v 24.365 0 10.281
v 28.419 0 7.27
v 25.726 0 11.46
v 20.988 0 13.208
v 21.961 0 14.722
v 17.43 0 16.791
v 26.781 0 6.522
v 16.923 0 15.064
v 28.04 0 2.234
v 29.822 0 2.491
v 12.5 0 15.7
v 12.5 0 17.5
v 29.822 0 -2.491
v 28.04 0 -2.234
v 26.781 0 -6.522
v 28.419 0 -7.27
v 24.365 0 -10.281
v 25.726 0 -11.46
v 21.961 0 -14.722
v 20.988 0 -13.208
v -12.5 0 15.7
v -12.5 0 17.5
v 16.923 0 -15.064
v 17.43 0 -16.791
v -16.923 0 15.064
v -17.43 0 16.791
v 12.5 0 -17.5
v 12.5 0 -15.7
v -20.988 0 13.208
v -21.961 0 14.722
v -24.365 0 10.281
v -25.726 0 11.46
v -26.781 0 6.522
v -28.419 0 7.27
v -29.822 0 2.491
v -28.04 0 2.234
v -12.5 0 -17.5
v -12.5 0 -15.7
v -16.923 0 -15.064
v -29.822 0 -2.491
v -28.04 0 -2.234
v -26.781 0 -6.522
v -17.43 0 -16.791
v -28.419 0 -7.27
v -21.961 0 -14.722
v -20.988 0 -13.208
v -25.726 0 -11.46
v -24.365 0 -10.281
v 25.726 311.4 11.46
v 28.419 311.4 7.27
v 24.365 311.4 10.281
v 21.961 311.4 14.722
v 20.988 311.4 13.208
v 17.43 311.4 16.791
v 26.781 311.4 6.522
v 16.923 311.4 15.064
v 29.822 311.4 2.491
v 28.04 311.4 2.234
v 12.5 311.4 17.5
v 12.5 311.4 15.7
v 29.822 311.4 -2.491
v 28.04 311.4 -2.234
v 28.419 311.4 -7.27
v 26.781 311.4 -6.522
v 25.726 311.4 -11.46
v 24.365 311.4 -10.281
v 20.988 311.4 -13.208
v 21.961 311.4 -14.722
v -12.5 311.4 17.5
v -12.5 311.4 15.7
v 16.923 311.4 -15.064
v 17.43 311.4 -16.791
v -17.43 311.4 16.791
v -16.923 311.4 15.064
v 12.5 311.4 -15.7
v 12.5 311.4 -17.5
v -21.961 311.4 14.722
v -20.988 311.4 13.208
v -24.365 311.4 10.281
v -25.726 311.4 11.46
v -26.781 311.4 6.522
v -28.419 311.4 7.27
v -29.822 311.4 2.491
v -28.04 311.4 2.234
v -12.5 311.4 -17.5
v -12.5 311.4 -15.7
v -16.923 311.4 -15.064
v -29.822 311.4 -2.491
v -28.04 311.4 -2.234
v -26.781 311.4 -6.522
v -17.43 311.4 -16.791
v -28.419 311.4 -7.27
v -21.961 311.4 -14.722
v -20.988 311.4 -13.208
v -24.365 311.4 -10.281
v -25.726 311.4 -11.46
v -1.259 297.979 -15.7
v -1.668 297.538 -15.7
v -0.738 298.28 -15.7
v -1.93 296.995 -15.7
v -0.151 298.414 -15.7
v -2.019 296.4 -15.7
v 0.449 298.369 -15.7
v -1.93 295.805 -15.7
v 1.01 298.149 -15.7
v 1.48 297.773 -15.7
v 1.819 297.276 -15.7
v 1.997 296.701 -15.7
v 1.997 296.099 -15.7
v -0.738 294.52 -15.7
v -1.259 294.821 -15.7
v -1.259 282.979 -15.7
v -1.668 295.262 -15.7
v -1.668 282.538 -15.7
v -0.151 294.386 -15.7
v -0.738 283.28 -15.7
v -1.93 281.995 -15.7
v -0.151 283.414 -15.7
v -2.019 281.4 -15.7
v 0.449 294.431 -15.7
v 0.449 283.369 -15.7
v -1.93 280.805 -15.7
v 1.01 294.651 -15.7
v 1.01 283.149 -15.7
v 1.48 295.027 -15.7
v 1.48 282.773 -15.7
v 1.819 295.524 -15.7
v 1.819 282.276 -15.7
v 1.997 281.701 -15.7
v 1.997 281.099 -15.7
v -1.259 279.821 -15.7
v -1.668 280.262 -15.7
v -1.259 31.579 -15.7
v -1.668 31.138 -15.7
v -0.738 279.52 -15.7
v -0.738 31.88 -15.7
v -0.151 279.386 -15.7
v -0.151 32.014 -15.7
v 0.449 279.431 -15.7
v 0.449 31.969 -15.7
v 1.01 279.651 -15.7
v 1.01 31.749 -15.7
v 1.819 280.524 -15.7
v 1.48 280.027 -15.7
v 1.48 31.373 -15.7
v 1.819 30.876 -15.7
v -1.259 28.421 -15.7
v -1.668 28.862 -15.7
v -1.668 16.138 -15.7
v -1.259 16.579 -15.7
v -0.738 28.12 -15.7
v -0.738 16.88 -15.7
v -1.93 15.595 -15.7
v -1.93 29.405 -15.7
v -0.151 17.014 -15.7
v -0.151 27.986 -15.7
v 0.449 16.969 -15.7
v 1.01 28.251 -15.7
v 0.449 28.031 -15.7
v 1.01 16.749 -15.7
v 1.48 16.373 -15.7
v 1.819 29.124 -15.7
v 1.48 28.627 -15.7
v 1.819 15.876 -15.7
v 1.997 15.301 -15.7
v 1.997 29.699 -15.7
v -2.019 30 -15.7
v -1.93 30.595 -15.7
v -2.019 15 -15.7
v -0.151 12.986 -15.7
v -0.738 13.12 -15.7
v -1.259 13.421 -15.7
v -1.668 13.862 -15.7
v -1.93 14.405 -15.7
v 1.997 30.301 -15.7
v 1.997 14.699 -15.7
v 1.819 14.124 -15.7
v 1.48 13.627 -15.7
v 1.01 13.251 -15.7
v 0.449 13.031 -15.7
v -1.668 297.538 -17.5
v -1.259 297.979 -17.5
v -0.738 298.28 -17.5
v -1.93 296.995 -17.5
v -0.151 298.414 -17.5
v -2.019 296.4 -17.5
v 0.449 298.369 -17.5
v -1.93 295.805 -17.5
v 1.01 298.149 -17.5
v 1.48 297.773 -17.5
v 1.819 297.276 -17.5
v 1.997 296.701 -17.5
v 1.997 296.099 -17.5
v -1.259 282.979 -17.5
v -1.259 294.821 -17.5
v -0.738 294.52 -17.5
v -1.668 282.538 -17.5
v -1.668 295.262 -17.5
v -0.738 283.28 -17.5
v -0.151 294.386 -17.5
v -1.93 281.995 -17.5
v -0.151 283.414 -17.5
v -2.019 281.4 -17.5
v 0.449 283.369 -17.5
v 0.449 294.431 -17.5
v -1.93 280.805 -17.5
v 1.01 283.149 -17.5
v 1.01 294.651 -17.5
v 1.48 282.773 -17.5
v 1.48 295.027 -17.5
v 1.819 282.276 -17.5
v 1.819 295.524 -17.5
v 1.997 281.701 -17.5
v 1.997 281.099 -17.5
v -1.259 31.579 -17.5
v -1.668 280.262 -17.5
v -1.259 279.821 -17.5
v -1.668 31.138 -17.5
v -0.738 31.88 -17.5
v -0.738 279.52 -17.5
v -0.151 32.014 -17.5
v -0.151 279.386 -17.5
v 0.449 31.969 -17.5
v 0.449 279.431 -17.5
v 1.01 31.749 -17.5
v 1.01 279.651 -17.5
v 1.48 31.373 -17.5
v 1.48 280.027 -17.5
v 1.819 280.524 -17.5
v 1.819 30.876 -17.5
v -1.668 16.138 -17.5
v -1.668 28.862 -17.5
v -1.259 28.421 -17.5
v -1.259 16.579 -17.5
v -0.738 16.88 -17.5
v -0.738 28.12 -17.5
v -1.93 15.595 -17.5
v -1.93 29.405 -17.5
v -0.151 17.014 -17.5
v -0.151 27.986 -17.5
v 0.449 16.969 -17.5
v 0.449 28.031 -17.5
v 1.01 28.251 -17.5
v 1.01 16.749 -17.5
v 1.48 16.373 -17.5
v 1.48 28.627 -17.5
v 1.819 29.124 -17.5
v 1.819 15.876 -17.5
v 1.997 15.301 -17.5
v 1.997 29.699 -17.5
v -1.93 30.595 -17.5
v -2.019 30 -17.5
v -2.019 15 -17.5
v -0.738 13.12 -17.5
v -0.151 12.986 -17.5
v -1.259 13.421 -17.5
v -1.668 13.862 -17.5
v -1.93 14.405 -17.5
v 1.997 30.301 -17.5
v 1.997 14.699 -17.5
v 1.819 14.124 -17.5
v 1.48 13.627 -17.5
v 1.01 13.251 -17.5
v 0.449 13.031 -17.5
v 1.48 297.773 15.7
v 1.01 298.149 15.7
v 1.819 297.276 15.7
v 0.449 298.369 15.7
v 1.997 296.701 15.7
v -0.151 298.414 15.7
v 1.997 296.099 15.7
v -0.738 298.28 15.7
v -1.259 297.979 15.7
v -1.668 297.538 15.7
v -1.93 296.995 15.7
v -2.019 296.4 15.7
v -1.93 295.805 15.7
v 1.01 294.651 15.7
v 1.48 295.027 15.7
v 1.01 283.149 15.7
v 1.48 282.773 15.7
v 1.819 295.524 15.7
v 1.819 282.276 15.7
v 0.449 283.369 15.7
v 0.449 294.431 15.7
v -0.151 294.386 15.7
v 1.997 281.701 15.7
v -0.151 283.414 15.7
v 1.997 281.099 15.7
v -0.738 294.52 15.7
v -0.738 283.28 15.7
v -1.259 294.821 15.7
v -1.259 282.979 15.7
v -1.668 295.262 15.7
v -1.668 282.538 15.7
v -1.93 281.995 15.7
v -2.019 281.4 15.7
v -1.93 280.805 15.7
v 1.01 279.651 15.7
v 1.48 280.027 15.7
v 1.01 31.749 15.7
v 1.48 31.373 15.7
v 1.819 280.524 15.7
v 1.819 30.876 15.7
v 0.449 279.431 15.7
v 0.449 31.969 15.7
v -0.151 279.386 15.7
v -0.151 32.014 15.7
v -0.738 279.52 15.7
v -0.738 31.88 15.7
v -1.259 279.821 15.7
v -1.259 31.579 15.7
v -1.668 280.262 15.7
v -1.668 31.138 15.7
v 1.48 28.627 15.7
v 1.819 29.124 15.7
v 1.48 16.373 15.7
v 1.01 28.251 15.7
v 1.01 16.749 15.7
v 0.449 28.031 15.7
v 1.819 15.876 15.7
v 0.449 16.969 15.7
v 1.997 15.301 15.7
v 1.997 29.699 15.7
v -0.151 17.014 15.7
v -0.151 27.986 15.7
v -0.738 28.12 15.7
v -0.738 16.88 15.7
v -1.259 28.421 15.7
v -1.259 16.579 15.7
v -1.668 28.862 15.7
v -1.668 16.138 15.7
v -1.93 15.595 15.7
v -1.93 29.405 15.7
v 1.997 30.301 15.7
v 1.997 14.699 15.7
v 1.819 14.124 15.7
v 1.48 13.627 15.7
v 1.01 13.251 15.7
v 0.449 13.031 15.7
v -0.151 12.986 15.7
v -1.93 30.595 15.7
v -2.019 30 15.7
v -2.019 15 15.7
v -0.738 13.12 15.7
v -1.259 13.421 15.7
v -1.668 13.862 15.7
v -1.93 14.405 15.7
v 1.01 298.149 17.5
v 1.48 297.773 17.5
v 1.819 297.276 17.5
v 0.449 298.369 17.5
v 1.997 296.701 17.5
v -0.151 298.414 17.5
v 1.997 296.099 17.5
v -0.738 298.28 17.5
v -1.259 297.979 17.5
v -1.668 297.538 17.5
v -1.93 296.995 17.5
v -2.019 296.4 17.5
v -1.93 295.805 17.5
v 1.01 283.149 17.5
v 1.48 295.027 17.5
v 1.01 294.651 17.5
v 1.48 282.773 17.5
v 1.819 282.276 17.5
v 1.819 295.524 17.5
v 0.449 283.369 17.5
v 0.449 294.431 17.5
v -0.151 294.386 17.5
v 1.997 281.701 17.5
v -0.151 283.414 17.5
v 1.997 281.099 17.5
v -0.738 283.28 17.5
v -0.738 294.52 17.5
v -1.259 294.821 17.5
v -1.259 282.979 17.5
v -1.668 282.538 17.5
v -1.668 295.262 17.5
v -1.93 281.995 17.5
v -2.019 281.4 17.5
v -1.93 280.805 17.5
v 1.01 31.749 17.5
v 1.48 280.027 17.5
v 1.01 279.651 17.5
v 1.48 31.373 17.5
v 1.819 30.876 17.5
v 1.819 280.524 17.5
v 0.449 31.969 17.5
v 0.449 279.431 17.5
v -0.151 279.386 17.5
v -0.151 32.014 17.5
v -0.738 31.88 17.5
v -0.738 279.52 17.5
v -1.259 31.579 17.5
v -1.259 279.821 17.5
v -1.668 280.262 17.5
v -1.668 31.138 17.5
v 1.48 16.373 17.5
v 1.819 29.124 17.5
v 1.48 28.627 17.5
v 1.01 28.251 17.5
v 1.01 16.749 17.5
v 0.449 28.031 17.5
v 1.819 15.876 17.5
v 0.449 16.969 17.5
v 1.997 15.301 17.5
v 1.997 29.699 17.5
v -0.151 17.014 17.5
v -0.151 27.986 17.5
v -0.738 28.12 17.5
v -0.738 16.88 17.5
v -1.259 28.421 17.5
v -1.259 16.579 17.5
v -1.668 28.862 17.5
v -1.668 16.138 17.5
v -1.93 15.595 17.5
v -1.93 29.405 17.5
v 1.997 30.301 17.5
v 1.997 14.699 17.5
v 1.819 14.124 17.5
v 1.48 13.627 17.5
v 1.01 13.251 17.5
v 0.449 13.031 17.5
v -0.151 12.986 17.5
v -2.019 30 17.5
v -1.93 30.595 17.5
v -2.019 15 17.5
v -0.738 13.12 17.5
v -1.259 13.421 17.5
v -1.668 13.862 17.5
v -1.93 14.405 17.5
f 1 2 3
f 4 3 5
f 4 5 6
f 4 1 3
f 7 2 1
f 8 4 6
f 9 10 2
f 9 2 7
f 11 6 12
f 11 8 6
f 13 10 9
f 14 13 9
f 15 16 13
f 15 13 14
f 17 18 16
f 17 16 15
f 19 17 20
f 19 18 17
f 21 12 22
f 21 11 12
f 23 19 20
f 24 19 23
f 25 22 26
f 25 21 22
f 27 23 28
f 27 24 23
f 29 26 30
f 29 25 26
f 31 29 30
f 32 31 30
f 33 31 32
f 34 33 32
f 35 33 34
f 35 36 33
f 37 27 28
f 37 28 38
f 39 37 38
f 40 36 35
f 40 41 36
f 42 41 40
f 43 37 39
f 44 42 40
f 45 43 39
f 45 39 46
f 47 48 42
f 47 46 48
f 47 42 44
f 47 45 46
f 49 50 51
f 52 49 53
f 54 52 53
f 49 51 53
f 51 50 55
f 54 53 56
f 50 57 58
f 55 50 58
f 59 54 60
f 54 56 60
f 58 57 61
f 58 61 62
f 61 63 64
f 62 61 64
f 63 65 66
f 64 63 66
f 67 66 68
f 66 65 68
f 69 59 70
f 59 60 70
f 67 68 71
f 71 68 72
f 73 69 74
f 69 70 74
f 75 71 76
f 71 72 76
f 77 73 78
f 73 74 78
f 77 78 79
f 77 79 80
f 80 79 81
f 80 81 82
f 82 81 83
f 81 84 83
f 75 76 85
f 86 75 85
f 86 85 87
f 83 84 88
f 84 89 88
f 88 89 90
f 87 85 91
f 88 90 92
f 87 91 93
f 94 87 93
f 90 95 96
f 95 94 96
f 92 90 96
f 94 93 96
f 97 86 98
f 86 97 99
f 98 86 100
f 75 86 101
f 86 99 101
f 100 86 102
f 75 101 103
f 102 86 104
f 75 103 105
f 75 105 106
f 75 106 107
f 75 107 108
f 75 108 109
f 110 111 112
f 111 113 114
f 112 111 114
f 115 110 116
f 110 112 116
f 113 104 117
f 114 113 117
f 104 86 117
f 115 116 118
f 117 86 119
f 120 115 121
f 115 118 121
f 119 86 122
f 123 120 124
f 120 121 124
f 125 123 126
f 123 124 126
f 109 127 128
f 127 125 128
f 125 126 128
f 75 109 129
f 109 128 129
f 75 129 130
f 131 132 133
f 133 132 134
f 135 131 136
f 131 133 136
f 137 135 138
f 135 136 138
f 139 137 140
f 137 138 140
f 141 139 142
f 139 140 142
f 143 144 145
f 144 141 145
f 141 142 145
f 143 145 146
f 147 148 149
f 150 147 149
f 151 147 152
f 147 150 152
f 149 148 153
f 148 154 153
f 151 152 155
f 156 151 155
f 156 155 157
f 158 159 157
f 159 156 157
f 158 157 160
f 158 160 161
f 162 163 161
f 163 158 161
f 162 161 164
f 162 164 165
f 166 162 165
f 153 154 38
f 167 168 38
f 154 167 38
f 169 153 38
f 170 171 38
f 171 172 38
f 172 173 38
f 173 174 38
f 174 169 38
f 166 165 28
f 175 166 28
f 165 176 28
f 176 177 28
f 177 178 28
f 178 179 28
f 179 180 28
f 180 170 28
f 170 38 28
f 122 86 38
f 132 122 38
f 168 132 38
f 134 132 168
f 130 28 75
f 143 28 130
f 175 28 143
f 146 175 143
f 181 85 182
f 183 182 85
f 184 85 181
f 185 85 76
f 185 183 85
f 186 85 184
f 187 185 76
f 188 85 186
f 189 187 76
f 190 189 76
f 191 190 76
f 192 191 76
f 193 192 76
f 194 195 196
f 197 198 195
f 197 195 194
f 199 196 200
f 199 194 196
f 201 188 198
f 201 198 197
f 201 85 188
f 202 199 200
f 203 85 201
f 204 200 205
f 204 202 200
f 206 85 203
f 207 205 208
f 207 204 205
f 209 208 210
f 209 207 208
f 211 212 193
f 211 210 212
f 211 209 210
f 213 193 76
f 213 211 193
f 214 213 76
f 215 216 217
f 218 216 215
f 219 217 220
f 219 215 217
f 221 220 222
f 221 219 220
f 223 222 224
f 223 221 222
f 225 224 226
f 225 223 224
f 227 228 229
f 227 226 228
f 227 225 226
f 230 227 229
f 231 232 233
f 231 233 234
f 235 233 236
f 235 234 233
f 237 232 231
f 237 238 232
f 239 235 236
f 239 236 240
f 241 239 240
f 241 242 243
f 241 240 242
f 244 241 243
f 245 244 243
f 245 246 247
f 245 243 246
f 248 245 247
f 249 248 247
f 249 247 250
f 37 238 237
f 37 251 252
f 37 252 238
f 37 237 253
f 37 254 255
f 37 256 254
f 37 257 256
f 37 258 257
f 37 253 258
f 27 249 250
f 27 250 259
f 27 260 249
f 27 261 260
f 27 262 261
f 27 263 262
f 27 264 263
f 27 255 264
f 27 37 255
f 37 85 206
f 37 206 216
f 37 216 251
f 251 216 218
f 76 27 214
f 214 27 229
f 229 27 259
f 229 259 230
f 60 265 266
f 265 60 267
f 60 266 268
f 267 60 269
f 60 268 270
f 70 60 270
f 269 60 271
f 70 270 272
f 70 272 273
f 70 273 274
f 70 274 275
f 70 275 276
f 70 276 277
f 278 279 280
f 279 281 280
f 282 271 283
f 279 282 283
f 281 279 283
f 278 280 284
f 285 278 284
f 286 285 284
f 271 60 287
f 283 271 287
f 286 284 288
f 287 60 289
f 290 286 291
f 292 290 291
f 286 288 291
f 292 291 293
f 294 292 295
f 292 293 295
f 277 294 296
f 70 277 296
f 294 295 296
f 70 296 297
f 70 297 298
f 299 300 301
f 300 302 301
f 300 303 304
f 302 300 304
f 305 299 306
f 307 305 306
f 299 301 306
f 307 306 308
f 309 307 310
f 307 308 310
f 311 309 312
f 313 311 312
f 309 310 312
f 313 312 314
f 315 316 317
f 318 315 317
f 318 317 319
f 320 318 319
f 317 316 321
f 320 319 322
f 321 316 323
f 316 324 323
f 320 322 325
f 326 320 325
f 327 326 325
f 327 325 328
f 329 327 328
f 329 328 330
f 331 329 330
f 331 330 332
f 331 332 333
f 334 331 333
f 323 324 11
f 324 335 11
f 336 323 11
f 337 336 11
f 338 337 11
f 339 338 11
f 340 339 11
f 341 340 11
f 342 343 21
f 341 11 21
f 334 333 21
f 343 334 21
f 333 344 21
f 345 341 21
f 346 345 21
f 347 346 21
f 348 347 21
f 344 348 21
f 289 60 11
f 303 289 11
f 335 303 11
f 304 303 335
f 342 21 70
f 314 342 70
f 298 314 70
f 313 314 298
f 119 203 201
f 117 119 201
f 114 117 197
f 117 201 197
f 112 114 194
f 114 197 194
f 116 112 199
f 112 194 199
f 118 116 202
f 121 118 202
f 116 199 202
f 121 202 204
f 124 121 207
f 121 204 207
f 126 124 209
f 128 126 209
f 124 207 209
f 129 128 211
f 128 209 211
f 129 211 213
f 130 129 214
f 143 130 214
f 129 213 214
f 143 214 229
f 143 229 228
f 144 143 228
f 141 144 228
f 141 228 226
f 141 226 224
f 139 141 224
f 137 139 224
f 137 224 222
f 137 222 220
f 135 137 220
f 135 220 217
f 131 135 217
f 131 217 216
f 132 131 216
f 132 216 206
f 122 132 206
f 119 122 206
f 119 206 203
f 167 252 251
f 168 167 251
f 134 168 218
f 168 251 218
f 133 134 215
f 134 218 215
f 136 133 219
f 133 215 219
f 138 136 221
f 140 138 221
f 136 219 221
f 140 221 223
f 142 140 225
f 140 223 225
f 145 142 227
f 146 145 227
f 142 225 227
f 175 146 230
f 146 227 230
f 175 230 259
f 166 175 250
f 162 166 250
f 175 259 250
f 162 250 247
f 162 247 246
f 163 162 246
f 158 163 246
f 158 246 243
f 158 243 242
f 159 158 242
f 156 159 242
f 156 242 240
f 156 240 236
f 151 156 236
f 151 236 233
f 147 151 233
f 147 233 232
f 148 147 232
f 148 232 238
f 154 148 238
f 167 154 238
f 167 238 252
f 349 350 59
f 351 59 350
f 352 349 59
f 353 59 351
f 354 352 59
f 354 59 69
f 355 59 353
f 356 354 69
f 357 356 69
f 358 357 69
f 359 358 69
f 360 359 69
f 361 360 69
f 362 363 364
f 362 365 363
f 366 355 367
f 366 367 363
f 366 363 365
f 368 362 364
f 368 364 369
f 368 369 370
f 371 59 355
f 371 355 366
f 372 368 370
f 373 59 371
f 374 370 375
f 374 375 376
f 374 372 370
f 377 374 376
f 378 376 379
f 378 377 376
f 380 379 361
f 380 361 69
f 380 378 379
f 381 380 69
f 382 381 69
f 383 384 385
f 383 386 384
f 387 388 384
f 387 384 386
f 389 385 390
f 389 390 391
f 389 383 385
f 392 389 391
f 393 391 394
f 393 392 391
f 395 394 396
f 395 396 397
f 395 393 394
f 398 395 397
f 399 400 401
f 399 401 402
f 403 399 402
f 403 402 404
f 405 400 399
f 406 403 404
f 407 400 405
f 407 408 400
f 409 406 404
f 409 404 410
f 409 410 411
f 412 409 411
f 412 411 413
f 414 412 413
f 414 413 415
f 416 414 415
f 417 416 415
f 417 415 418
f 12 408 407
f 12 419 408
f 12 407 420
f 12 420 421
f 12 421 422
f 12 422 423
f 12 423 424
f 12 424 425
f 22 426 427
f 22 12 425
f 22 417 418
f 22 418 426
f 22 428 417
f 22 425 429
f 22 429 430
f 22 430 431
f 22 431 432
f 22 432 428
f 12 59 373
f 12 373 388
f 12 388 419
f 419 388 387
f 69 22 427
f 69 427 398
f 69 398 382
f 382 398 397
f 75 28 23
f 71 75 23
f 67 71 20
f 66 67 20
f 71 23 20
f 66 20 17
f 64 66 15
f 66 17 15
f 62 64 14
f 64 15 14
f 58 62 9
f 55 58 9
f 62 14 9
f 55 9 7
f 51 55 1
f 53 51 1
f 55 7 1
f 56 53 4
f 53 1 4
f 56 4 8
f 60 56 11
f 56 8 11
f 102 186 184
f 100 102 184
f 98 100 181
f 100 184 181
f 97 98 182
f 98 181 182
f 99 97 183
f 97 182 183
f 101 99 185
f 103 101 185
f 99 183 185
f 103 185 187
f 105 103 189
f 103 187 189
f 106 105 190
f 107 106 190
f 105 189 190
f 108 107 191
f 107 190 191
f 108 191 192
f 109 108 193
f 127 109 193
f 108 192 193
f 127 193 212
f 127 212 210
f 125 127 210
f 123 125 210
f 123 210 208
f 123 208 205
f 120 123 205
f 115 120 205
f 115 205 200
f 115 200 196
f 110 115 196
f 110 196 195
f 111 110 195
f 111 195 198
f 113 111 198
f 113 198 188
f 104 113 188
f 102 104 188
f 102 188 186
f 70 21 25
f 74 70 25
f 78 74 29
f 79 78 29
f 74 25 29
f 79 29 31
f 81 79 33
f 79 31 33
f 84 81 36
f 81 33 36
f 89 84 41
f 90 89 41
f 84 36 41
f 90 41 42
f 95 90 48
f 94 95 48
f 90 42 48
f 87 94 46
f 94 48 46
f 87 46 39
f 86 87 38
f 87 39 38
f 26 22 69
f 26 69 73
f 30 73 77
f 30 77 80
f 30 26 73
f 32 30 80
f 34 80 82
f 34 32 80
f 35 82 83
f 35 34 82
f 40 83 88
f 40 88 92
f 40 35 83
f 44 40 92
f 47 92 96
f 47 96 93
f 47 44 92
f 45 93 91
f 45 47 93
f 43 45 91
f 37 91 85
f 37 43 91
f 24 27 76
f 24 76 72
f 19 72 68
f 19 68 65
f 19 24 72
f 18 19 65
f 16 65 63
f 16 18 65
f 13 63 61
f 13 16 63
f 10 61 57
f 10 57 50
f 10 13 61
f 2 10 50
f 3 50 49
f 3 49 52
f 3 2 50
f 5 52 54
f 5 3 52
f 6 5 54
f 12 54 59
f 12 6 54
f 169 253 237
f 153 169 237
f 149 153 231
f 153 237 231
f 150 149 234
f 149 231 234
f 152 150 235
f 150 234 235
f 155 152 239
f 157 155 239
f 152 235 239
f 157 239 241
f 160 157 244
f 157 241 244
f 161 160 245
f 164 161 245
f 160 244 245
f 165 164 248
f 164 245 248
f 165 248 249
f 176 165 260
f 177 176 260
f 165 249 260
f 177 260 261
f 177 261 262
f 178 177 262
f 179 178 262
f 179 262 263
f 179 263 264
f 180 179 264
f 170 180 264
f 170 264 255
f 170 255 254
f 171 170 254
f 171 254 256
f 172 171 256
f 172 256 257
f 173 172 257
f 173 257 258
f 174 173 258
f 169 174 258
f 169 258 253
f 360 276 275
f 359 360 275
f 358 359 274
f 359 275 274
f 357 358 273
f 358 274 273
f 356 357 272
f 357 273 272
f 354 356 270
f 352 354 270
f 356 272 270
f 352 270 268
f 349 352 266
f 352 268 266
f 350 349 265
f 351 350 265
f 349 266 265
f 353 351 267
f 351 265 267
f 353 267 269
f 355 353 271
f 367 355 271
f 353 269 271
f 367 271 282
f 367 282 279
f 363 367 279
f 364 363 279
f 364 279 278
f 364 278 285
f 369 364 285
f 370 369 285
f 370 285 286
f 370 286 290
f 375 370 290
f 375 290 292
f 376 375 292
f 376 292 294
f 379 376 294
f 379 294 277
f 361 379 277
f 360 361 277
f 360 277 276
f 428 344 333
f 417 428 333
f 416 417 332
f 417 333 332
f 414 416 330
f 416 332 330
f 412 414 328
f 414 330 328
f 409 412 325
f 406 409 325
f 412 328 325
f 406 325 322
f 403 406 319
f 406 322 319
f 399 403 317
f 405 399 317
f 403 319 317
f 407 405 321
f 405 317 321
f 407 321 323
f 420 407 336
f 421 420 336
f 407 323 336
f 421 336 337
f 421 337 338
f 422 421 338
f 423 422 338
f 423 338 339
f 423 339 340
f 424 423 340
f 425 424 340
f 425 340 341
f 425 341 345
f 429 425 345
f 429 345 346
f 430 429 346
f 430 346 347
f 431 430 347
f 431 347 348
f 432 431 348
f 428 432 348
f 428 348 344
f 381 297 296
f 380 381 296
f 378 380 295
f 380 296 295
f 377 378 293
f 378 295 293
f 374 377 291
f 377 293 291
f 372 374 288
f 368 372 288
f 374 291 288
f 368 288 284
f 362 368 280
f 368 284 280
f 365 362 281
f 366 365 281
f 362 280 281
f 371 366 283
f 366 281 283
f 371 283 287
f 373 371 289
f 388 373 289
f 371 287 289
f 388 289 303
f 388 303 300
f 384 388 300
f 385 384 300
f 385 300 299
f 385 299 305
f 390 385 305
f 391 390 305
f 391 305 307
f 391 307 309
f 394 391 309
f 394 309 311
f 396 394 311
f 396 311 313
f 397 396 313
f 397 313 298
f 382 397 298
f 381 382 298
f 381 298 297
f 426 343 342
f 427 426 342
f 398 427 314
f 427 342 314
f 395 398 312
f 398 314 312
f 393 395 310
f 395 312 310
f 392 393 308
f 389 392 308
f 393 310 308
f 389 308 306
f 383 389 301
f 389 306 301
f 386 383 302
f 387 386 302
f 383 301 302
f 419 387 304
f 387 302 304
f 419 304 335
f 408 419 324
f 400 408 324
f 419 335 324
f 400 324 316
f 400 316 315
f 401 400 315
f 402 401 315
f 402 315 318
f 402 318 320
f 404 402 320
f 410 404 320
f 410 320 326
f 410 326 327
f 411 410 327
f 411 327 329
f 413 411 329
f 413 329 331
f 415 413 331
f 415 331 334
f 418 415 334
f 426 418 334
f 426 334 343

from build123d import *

# Parameters (mm, degrees)
EXTRUDE_1_DEPTH       = 311.4
HOLE_WIZARD_10_32_1_D = 4.0386


with BuildPart() as part:
    # 草圖1 → 填料-伸長1 (new body)
    with BuildSketch(Plane(origin=(0, 0, 0), x_dir=(1, 0, 0), z_dir=(0, 1, 0))):
        with BuildLine():
            Line((-12.5, 17.5), (12.5, 17.5))
            ThreePointArc((12.5, 17.5), (30, 0), (12.5, -17.5))
            Line((12.5, -17.5), (-12.5, -17.5))
            ThreePointArc((-12.5, -17.5), (-30, 0), (-12.5, 17.5))
        make_face()
        with BuildLine():
            Line((-12.5, 15.7), (12.5, 15.7))
            ThreePointArc((12.5, 15.7), (28.2, 0), (12.5, -15.7))
            Line((12.5, -15.7), (-12.5, -15.7))
            ThreePointArc((-12.5, -15.7), (-28.2, 0), (-12.5, 15.7))
        make_face(mode=Mode.SUBTRACT)
    extrude(amount=EXTRUDE_1_DEPTH)

    # #10-32 螺紋孔1 (through all)
    with Locations(Plane.XY.offset(17.5)):
        with Locations((0, 15), (0, 30), (0, 296.4), (0, 281.4)):
            Hole(HOLE_WIZARD_10_32_1_D / 2)


solid = part.part
